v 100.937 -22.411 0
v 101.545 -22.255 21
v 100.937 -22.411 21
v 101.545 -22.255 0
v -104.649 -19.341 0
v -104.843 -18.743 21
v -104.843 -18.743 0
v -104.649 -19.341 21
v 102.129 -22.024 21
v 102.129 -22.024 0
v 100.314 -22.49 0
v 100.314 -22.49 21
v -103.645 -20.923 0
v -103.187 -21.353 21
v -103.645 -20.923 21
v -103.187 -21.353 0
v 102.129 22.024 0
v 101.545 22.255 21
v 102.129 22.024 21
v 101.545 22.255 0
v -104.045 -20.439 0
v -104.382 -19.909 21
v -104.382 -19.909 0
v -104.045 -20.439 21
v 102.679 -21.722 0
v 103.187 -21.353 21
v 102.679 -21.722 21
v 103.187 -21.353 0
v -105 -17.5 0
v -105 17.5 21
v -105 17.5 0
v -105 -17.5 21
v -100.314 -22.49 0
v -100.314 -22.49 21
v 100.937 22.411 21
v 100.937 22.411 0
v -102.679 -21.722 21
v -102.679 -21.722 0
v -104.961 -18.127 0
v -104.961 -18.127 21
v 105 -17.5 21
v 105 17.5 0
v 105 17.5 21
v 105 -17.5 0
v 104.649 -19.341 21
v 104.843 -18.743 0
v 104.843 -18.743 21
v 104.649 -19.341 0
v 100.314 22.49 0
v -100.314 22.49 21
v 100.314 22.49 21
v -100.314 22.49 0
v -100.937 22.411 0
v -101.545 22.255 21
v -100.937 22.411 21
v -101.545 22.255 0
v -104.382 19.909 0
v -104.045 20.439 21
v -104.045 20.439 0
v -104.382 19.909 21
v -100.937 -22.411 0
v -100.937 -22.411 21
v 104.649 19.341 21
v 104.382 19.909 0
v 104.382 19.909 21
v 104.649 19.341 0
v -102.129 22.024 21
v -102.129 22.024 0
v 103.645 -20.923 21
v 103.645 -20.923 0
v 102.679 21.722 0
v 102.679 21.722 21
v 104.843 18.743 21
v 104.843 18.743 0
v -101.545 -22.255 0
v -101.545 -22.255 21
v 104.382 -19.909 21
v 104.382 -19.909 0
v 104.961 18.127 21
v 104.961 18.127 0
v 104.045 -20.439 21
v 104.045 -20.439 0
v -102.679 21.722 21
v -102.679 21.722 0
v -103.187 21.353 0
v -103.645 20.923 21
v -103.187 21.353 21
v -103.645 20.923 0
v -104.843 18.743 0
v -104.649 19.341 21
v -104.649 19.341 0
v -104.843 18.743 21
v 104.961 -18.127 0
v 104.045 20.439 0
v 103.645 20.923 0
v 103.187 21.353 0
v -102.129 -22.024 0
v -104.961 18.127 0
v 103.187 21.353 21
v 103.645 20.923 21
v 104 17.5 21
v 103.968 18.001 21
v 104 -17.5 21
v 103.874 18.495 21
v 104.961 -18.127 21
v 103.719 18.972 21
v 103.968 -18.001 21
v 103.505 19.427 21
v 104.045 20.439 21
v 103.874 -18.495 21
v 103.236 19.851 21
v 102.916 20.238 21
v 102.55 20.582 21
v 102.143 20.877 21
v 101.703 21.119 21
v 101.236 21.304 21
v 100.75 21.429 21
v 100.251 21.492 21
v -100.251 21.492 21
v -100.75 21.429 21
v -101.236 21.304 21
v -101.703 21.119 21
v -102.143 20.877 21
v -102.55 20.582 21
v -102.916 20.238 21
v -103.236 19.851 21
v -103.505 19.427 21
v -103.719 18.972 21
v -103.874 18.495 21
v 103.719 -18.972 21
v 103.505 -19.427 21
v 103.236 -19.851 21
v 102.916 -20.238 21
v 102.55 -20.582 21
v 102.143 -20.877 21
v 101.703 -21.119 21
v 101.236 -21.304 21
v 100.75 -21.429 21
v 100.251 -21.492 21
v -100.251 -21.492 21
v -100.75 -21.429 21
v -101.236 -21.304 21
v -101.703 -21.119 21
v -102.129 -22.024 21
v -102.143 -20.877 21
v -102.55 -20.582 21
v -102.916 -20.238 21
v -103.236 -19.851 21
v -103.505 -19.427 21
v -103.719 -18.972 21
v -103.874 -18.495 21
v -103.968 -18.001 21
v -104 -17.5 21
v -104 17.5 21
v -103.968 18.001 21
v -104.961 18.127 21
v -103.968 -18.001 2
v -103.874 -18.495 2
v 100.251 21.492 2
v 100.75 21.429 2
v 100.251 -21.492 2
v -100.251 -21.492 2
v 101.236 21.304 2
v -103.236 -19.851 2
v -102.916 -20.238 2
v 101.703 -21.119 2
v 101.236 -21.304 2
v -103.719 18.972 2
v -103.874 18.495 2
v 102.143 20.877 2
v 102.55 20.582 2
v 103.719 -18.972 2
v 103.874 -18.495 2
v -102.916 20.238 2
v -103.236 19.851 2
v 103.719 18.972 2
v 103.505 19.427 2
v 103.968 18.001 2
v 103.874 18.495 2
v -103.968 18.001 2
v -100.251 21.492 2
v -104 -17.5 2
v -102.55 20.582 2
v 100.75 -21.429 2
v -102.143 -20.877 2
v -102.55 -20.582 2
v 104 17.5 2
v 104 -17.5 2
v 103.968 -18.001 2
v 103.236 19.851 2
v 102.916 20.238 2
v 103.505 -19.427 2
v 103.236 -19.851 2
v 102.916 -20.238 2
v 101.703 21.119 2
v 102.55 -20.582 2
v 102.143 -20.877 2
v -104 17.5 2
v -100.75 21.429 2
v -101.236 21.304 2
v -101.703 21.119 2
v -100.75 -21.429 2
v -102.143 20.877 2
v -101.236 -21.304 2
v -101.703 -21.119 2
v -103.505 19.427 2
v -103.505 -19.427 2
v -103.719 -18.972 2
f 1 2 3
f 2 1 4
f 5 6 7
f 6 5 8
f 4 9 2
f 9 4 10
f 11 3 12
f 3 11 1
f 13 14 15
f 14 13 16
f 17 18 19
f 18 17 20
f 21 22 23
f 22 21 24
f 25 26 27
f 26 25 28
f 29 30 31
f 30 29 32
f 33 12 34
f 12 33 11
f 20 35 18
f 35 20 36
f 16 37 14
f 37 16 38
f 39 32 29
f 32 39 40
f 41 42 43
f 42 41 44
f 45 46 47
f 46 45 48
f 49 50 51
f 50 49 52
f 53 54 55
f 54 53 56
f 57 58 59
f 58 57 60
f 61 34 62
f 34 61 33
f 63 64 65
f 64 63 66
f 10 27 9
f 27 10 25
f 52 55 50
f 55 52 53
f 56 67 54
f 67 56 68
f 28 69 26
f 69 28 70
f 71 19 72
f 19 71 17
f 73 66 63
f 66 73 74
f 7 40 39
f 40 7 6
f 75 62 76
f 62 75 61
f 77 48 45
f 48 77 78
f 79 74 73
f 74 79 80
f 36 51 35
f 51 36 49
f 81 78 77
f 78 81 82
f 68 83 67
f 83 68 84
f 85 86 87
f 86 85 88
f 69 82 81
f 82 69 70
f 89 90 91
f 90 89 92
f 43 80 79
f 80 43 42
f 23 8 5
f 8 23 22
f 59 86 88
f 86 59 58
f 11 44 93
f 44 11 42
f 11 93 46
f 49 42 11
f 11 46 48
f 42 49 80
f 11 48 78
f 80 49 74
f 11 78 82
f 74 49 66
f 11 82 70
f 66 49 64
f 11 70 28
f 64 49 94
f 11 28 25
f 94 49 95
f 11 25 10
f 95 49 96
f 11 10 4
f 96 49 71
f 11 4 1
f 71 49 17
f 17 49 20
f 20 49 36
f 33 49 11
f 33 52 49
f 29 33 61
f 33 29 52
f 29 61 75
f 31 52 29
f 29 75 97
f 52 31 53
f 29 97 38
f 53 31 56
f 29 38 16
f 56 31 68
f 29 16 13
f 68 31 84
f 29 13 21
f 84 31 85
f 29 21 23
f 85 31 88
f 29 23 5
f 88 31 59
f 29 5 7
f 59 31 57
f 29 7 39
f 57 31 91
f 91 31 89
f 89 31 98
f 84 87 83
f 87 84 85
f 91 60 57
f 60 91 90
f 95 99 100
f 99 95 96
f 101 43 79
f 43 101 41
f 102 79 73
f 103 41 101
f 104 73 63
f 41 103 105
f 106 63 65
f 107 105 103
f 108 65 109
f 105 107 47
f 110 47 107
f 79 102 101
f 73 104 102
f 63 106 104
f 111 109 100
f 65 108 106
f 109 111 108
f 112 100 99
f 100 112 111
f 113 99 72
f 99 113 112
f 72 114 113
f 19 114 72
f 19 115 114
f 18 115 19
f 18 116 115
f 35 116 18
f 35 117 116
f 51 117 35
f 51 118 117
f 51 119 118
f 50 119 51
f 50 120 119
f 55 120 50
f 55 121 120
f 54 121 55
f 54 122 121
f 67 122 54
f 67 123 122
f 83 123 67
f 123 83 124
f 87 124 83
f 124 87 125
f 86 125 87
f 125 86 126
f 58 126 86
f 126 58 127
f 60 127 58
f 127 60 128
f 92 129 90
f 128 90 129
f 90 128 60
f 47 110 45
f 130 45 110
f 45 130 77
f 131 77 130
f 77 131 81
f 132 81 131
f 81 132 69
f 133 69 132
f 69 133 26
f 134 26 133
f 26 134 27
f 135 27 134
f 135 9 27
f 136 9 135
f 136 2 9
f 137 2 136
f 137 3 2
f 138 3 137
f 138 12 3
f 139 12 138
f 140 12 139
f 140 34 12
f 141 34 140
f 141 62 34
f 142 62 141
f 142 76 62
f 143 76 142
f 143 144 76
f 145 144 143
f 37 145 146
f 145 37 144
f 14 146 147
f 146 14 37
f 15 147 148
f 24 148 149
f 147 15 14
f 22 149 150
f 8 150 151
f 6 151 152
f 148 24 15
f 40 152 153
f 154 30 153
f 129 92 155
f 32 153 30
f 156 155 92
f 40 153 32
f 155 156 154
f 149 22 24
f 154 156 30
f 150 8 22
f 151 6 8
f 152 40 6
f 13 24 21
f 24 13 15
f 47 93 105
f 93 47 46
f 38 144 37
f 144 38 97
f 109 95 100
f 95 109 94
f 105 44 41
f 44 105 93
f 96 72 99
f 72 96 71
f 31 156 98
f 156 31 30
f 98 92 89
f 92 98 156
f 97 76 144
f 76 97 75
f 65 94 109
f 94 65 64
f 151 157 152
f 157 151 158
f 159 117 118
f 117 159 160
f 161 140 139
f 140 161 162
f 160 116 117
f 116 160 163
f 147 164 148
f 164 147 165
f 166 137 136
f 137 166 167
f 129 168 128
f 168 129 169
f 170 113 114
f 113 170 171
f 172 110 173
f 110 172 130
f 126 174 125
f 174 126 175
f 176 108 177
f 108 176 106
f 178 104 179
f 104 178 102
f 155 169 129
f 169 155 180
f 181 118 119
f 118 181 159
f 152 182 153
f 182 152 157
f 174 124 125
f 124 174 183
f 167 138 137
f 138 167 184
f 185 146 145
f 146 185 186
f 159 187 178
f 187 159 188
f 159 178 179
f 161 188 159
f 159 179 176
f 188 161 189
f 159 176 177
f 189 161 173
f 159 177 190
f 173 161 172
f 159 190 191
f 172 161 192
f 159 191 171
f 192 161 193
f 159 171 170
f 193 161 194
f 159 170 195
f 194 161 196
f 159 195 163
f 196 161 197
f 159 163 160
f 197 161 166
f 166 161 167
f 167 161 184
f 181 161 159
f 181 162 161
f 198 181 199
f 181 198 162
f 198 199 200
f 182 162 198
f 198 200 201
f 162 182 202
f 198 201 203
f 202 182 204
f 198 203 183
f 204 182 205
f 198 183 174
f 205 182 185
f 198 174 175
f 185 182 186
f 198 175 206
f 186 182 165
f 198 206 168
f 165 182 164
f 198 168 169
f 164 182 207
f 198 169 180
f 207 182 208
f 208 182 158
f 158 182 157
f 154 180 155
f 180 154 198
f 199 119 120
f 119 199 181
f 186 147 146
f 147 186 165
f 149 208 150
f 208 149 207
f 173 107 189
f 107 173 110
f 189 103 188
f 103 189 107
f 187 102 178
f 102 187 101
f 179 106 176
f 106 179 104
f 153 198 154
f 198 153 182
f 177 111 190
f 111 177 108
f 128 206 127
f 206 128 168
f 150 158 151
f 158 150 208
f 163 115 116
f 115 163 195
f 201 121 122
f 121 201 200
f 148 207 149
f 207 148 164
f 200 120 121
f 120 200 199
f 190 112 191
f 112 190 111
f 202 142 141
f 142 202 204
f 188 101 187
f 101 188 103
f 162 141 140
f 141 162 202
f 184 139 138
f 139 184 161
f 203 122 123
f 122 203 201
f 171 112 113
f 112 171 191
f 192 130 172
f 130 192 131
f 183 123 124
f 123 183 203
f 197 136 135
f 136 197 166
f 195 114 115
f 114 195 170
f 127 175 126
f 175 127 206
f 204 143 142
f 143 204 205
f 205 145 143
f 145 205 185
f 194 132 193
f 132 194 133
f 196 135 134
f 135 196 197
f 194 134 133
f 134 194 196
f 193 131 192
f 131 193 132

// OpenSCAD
$fn = 50;


difference() {
	union() {
		hull() {
			translate(v = [-100.0000000000, 17.5000000000, 0]) {
				cylinder(h = 21, r = 5);
			}
			translate(v = [100.0000000000, 17.5000000000, 0]) {
				cylinder(h = 21, r = 5);
			}
			translate(v = [-100.0000000000, -17.5000000000, 0]) {
				cylinder(h = 21, r = 5);
			}
			translate(v = [100.0000000000, -17.5000000000, 0]) {
				cylinder(h = 21, r = 5);
			}
		}
	}
	union() {
		translate(v = [0, 0, 2]) {
			hull() {
				translate(v = [-100.0000000000, 17.5000000000, 0]) {
					cylinder(h = 19, r = 4);
				}
				translate(v = [100.0000000000, 17.5000000000, 0]) {
					cylinder(h = 19, r = 4);
				}
				translate(v = [-100.0000000000, -17.5000000000, 0]) {
					cylinder(h = 19, r = 4);
				}
				translate(v = [100.0000000000, -17.5000000000, 0]) {
					cylinder(h = 19, r = 4);
				}
			}
		}
	}
}
